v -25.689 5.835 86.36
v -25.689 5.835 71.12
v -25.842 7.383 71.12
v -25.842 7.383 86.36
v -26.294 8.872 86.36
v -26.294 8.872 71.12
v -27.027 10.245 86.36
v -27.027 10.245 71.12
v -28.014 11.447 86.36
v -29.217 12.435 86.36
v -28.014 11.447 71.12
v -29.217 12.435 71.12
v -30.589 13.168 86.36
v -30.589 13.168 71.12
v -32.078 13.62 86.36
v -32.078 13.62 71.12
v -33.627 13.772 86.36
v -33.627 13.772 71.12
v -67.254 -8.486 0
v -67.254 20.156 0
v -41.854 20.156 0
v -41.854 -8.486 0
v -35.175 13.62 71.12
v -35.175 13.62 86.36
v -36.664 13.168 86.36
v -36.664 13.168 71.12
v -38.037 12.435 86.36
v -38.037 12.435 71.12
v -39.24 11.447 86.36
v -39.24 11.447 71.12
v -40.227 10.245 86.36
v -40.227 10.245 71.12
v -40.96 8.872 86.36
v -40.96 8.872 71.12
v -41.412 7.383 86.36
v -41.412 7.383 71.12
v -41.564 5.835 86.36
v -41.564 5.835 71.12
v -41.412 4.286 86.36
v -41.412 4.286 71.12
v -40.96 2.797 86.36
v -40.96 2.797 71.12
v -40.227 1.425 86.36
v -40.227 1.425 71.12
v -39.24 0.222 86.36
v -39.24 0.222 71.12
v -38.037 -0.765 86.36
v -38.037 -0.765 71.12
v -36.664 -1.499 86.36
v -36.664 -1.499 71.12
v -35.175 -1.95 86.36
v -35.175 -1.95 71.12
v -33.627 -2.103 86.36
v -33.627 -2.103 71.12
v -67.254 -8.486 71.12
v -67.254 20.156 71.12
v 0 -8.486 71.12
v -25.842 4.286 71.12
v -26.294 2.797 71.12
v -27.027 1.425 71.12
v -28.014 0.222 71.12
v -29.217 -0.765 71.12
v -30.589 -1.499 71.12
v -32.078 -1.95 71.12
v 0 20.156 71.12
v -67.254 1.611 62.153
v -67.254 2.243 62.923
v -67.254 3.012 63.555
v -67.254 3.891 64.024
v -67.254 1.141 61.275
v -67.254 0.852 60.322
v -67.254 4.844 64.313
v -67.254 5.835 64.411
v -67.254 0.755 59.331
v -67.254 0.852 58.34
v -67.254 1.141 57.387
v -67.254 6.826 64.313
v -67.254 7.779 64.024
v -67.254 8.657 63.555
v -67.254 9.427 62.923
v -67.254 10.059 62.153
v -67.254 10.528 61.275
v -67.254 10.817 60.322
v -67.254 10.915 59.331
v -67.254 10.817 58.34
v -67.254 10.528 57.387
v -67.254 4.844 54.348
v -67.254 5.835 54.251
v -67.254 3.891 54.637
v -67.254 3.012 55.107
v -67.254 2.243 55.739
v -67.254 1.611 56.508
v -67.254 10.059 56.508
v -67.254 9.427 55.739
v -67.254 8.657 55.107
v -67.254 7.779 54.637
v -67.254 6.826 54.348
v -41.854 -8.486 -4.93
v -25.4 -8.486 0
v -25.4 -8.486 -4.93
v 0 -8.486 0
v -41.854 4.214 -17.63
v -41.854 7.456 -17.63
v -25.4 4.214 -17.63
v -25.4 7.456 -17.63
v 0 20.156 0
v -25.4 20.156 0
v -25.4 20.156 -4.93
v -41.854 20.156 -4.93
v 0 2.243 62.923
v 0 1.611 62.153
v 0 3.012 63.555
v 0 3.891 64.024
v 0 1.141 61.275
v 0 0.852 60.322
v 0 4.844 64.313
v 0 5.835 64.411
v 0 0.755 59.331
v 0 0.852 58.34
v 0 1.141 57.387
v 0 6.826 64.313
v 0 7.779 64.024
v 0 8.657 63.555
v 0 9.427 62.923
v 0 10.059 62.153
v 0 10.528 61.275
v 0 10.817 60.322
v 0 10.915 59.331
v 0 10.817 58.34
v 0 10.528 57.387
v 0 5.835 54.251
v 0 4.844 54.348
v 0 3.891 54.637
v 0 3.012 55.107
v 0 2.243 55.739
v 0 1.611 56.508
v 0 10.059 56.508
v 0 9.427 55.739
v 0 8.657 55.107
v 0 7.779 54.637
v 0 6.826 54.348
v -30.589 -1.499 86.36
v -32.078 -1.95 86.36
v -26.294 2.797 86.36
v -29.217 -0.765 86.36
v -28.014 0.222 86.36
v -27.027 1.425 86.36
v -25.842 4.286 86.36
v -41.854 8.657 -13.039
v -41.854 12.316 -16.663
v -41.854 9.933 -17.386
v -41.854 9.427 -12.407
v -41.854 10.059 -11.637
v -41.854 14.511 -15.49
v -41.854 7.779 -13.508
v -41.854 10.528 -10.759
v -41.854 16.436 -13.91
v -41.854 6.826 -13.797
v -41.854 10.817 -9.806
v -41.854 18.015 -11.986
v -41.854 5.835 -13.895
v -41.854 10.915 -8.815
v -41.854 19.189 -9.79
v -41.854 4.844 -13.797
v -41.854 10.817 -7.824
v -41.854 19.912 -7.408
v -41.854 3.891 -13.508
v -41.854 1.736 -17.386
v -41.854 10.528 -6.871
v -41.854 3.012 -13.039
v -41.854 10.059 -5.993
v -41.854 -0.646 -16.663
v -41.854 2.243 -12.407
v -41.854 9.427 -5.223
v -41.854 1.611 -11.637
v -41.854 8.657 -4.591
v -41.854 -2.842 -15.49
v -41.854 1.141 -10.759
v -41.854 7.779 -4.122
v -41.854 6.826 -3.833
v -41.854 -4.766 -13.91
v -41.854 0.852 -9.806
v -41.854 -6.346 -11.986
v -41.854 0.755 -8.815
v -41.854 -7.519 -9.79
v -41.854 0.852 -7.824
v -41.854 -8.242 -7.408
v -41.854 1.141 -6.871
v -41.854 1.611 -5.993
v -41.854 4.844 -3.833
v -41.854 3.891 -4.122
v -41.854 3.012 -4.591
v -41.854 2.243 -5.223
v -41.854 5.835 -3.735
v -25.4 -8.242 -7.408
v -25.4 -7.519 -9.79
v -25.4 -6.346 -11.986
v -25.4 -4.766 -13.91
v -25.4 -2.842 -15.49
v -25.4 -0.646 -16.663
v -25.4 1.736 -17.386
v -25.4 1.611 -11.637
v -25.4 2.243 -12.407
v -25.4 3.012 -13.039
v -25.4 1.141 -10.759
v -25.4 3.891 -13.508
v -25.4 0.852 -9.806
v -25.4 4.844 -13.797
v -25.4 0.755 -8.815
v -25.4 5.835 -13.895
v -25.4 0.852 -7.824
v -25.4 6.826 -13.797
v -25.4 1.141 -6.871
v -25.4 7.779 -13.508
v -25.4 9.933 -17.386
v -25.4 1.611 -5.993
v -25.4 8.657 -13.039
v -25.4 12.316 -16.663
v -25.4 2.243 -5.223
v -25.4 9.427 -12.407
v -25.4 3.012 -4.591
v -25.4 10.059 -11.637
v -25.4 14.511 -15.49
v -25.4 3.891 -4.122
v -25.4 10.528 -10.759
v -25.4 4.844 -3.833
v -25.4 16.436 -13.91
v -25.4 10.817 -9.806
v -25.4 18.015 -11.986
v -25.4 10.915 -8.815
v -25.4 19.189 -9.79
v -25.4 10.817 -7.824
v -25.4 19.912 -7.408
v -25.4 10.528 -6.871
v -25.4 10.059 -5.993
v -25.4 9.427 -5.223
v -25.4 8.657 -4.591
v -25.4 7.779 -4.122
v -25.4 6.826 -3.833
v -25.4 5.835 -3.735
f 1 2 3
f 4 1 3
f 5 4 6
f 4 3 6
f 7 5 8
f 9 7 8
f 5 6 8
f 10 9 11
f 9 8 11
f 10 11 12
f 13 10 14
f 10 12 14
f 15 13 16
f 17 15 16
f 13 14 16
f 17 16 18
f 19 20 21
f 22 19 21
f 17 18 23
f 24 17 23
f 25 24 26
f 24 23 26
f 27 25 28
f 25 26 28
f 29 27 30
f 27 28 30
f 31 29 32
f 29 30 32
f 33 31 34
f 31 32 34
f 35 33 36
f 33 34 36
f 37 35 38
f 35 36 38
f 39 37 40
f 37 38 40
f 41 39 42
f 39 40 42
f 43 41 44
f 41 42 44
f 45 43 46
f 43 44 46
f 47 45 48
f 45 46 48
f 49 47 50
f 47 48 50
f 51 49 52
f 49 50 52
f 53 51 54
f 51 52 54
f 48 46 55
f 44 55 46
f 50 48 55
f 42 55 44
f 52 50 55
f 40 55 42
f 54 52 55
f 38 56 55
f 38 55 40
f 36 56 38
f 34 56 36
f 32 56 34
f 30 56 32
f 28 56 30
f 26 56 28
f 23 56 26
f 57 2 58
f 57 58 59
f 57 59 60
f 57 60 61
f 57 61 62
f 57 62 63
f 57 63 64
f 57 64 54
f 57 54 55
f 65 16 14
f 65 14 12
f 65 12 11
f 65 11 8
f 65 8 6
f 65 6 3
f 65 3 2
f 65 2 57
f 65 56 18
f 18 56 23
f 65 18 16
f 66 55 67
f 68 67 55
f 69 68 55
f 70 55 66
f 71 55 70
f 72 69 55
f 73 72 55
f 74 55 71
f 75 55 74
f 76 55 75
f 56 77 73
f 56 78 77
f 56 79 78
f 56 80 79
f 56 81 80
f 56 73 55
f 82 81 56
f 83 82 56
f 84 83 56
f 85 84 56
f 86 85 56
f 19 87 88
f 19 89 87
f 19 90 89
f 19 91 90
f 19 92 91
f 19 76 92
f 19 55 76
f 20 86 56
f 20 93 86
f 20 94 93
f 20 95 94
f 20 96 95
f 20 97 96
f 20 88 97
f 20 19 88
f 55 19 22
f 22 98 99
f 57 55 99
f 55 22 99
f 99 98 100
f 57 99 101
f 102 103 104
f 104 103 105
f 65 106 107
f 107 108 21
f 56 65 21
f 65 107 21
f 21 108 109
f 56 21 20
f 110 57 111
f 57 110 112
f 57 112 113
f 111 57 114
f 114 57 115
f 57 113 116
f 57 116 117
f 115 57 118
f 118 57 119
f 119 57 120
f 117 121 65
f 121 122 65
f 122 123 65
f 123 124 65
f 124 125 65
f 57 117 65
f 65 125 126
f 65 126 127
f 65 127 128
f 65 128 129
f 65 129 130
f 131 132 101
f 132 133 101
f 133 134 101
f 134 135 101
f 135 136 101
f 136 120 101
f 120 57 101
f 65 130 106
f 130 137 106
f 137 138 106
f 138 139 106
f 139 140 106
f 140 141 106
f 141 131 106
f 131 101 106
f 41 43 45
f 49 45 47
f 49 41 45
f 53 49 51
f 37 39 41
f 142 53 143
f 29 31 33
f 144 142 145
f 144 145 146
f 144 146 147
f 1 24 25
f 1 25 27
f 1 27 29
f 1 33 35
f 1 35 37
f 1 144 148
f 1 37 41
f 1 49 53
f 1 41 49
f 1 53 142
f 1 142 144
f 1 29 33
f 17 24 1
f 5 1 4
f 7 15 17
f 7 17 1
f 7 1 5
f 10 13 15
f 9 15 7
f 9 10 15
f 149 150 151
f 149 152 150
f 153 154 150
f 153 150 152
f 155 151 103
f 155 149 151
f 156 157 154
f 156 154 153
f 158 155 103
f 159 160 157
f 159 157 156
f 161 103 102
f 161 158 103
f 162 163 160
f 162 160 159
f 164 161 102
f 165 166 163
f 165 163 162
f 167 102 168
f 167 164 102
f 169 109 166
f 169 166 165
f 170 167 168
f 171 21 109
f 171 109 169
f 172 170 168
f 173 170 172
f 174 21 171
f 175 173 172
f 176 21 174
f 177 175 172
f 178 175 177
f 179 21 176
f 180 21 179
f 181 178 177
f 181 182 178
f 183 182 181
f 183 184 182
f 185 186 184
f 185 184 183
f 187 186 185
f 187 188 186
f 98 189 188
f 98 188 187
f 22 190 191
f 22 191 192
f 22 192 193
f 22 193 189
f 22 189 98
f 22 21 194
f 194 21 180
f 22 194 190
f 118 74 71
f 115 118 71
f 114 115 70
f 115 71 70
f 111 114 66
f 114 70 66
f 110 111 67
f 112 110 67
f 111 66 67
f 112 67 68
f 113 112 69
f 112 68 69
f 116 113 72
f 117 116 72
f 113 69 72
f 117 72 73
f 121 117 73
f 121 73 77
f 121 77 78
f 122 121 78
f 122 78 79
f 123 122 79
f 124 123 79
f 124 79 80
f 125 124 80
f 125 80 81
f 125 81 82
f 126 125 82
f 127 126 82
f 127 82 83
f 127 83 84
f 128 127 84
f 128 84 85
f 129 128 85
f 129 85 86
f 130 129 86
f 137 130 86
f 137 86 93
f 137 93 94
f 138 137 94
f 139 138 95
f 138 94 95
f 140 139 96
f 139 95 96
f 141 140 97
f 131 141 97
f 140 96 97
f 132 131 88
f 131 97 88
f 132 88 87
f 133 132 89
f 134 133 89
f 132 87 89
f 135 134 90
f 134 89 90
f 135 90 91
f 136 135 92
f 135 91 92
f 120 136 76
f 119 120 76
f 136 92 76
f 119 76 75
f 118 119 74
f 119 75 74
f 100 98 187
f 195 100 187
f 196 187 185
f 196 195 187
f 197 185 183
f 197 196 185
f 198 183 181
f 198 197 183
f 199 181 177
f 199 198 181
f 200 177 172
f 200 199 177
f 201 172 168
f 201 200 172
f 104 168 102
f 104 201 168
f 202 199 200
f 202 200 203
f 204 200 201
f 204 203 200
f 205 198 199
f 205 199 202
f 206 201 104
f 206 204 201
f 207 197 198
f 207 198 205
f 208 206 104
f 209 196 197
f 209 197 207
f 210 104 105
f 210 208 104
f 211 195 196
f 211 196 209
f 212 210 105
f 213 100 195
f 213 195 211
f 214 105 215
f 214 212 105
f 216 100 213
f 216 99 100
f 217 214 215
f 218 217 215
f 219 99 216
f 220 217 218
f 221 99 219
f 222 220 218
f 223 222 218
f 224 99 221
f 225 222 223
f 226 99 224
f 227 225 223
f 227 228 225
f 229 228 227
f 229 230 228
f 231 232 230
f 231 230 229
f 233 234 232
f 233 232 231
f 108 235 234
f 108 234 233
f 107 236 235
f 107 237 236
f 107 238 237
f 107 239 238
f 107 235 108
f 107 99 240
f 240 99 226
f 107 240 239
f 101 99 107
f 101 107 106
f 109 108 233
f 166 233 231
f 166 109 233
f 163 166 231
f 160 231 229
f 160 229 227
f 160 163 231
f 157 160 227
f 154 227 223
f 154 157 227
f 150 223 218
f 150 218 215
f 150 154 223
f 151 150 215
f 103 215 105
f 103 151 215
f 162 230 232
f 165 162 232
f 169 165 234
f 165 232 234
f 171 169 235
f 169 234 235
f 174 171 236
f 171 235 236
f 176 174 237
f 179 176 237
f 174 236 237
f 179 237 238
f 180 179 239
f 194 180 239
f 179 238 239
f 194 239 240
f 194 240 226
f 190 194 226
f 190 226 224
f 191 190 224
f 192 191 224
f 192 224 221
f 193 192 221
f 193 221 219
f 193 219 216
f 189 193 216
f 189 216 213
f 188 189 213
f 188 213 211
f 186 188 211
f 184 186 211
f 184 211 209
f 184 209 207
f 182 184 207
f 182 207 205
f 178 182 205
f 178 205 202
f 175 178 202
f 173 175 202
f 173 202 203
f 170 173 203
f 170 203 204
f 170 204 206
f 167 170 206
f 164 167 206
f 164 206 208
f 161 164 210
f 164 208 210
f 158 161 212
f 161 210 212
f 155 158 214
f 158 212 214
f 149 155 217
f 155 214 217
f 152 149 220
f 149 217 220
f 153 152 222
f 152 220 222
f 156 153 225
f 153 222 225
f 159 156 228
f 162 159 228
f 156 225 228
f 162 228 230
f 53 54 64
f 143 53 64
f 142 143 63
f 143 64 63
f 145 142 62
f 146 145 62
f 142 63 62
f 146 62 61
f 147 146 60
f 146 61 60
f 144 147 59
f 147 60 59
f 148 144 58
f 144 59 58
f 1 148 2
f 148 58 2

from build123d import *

# Parameters (mm, degrees)
F0_W     = 25.4
F0_H     = 28.6416042886
F0_H_2   = 7.5187312844
F0_H_3   = 21.1228730042
F1_DEPTH = 71.12
F2_DEPTH = 86.36
F3_DEPTH = 17.629891634
F4_R     = 12.7
F6_D     = 10.16
F8_D     = 10.16


with BuildPart() as f1:
    # F0 (on Top) → F1 (new body)
    with BuildSketch(Plane.XY):
        with Locations((-54.5537182136, 5.834735956)):
            Rectangle(F0_W, F0_H)
        with BuildLine():
            Line((-33.6268591068, 20.1555381003), (-41.8537182136, 20.1555381003))
            Line((-41.8537182136, 20.1555381003), (-41.8537182136, -8.4860661883))
            Line((-41.8537182136, -8.4860661883), (-33.6268591068, -8.4860661883))
            Line((-33.6268591068, -8.4860661883), (-33.6268591068, -2.102764044))
            ThreePointArc((-33.6268591068, -2.102764044), (-41.5643591068, 5.834735956), (-33.6268591068, 13.772235956))
            Line((-33.6268591068, 13.772235956), (-33.6268591068, 20.1555381003))
        make_face()
        with BuildLine():
            Line((-25.4, 20.1555381003), (-33.6268591068, 20.1555381003))
            Line((-33.6268591068, 20.1555381003), (-33.6268591068, 13.772235956))
            ThreePointArc((-33.6268591068, 13.772235956), (-28.0141990311, 11.4473960317), (-25.6893591068, 5.834735956))
            ThreePointArc((-25.6893591068, 5.834735956), (-28.0141990311, 0.2220758803), (-33.6268591068, -2.102764044))
            Line((-33.6268591068, -2.102764044), (-33.6268591068, -8.4860661883))
            Line((-33.6268591068, -8.4860661883), (-25.4, -8.4860661883))
            Line((-25.4, -8.4860661883), (-25.4, 12.6368068159))
            Line((-25.4, 12.6368068159), (-25.4, 20.1555381003))
        make_face()
        with Locations((-12.7, 16.3961724581)):
            Rectangle(F0_W, F0_H_2)
        with BuildLine():
            Line((-33.6268591068, -2.102764044), (-33.6268591068, 13.772235956))
            ThreePointArc((-33.6268591068, 13.772235956), (-41.5643591068, 5.834735956), (-33.6268591068, -2.102764044))
        make_face()
        with Locations((-12.7, 2.0753703138)):
            Rectangle(F0_W, F0_H_3)
    extrude(amount=F1_DEPTH)

    # F0 (on Top) → F2 (join)
    with BuildSketch(Plane.XY):
        with BuildLine():
            Line((-33.6268591068, -2.102764044), (-33.6268591068, 13.772235956))
            ThreePointArc((-33.6268591068, 13.772235956), (-41.5643591068, 5.834735956), (-33.6268591068, -2.102764044))
        make_face()
        with BuildLine():
            ThreePointArc((-25.6893591068, 5.834735956), (-28.0141990311, 11.4473960317), (-33.6268591068, 13.772235956))
            Line((-33.6268591068, 13.772235956), (-33.6268591068, -2.102764044))
            ThreePointArc((-33.6268591068, -2.102764044), (-28.0141990311, 0.2220758803), (-25.6893591068, 5.834735956))
        make_face()
    extrude(amount=F2_DEPTH)

    # F0 (on Top) → F3 (join)
    with BuildSketch(Plane.XY):
        with BuildLine():
            ThreePointArc((-25.6893591068, 5.834735956), (-28.0141990311, 11.4473960317), (-33.6268591068, 13.772235956))
            Line((-33.6268591068, 13.772235956), (-33.6268591068, -2.102764044))
            ThreePointArc((-33.6268591068, -2.102764044), (-28.0141990311, 0.2220758803), (-25.6893591068, 5.834735956))
        make_face()
        with BuildLine():
            Line((-25.4, 20.1555381003), (-33.6268591068, 20.1555381003))
            Line((-33.6268591068, 20.1555381003), (-33.6268591068, 13.772235956))
            ThreePointArc((-33.6268591068, 13.772235956), (-28.0141990311, 11.4473960317), (-25.6893591068, 5.834735956))
            ThreePointArc((-25.6893591068, 5.834735956), (-28.0141990311, 0.2220758803), (-33.6268591068, -2.102764044))
            Line((-33.6268591068, -2.102764044), (-33.6268591068, -8.4860661883))
            Line((-33.6268591068, -8.4860661883), (-25.4, -8.4860661883))
            Line((-25.4, -8.4860661883), (-25.4, 12.6368068159))
            Line((-25.4, 12.6368068159), (-25.4, 20.1555381003))
        make_face()
        with BuildLine():
            Line((-33.6268591068, 20.1555381003), (-41.8537182136, 20.1555381003))
            Line((-41.8537182136, 20.1555381003), (-41.8537182136, -8.4860661883))
            Line((-41.8537182136, -8.4860661883), (-33.6268591068, -8.4860661883))
            Line((-33.6268591068, -8.4860661883), (-33.6268591068, -2.102764044))
            ThreePointArc((-33.6268591068, -2.102764044), (-41.5643591068, 5.834735956), (-33.6268591068, 13.772235956))
            Line((-33.6268591068, 13.772235956), (-33.6268591068, 20.1555381003))
        make_face()
        with BuildLine():
            Line((-33.6268591068, -2.102764044), (-33.6268591068, 13.772235956))
            ThreePointArc((-33.6268591068, 13.772235956), (-41.5643591068, 5.834735956), (-33.6268591068, -2.102764044))
        make_face()
    extrude(amount=-F3_DEPTH)

    # F4
    f4_edges = [f1.edges().sort_by_distance(p)[0] for p in [
        (-33.626859, -8.486066, -17.629892),
        (-33.626859, 20.155538, -17.629892),
    ]]
    fillet(f4_edges, radius=F4_R)

    # F6 (through all)
    with Locations(Plane(origin=(-41.8537182136, 0, 0), x_dir=(0, -1, 0), z_dir=(-1, 0, 0))):
        with Locations((-5.834735956, -8.814945817)):
            Hole(F6_D / 2)

    # F8 (through all)
    with Locations(Plane.YZ):
        with Locations((5.834735956, 59.3307428062)):
            Hole(F8_D / 2)


solid = f1.part
